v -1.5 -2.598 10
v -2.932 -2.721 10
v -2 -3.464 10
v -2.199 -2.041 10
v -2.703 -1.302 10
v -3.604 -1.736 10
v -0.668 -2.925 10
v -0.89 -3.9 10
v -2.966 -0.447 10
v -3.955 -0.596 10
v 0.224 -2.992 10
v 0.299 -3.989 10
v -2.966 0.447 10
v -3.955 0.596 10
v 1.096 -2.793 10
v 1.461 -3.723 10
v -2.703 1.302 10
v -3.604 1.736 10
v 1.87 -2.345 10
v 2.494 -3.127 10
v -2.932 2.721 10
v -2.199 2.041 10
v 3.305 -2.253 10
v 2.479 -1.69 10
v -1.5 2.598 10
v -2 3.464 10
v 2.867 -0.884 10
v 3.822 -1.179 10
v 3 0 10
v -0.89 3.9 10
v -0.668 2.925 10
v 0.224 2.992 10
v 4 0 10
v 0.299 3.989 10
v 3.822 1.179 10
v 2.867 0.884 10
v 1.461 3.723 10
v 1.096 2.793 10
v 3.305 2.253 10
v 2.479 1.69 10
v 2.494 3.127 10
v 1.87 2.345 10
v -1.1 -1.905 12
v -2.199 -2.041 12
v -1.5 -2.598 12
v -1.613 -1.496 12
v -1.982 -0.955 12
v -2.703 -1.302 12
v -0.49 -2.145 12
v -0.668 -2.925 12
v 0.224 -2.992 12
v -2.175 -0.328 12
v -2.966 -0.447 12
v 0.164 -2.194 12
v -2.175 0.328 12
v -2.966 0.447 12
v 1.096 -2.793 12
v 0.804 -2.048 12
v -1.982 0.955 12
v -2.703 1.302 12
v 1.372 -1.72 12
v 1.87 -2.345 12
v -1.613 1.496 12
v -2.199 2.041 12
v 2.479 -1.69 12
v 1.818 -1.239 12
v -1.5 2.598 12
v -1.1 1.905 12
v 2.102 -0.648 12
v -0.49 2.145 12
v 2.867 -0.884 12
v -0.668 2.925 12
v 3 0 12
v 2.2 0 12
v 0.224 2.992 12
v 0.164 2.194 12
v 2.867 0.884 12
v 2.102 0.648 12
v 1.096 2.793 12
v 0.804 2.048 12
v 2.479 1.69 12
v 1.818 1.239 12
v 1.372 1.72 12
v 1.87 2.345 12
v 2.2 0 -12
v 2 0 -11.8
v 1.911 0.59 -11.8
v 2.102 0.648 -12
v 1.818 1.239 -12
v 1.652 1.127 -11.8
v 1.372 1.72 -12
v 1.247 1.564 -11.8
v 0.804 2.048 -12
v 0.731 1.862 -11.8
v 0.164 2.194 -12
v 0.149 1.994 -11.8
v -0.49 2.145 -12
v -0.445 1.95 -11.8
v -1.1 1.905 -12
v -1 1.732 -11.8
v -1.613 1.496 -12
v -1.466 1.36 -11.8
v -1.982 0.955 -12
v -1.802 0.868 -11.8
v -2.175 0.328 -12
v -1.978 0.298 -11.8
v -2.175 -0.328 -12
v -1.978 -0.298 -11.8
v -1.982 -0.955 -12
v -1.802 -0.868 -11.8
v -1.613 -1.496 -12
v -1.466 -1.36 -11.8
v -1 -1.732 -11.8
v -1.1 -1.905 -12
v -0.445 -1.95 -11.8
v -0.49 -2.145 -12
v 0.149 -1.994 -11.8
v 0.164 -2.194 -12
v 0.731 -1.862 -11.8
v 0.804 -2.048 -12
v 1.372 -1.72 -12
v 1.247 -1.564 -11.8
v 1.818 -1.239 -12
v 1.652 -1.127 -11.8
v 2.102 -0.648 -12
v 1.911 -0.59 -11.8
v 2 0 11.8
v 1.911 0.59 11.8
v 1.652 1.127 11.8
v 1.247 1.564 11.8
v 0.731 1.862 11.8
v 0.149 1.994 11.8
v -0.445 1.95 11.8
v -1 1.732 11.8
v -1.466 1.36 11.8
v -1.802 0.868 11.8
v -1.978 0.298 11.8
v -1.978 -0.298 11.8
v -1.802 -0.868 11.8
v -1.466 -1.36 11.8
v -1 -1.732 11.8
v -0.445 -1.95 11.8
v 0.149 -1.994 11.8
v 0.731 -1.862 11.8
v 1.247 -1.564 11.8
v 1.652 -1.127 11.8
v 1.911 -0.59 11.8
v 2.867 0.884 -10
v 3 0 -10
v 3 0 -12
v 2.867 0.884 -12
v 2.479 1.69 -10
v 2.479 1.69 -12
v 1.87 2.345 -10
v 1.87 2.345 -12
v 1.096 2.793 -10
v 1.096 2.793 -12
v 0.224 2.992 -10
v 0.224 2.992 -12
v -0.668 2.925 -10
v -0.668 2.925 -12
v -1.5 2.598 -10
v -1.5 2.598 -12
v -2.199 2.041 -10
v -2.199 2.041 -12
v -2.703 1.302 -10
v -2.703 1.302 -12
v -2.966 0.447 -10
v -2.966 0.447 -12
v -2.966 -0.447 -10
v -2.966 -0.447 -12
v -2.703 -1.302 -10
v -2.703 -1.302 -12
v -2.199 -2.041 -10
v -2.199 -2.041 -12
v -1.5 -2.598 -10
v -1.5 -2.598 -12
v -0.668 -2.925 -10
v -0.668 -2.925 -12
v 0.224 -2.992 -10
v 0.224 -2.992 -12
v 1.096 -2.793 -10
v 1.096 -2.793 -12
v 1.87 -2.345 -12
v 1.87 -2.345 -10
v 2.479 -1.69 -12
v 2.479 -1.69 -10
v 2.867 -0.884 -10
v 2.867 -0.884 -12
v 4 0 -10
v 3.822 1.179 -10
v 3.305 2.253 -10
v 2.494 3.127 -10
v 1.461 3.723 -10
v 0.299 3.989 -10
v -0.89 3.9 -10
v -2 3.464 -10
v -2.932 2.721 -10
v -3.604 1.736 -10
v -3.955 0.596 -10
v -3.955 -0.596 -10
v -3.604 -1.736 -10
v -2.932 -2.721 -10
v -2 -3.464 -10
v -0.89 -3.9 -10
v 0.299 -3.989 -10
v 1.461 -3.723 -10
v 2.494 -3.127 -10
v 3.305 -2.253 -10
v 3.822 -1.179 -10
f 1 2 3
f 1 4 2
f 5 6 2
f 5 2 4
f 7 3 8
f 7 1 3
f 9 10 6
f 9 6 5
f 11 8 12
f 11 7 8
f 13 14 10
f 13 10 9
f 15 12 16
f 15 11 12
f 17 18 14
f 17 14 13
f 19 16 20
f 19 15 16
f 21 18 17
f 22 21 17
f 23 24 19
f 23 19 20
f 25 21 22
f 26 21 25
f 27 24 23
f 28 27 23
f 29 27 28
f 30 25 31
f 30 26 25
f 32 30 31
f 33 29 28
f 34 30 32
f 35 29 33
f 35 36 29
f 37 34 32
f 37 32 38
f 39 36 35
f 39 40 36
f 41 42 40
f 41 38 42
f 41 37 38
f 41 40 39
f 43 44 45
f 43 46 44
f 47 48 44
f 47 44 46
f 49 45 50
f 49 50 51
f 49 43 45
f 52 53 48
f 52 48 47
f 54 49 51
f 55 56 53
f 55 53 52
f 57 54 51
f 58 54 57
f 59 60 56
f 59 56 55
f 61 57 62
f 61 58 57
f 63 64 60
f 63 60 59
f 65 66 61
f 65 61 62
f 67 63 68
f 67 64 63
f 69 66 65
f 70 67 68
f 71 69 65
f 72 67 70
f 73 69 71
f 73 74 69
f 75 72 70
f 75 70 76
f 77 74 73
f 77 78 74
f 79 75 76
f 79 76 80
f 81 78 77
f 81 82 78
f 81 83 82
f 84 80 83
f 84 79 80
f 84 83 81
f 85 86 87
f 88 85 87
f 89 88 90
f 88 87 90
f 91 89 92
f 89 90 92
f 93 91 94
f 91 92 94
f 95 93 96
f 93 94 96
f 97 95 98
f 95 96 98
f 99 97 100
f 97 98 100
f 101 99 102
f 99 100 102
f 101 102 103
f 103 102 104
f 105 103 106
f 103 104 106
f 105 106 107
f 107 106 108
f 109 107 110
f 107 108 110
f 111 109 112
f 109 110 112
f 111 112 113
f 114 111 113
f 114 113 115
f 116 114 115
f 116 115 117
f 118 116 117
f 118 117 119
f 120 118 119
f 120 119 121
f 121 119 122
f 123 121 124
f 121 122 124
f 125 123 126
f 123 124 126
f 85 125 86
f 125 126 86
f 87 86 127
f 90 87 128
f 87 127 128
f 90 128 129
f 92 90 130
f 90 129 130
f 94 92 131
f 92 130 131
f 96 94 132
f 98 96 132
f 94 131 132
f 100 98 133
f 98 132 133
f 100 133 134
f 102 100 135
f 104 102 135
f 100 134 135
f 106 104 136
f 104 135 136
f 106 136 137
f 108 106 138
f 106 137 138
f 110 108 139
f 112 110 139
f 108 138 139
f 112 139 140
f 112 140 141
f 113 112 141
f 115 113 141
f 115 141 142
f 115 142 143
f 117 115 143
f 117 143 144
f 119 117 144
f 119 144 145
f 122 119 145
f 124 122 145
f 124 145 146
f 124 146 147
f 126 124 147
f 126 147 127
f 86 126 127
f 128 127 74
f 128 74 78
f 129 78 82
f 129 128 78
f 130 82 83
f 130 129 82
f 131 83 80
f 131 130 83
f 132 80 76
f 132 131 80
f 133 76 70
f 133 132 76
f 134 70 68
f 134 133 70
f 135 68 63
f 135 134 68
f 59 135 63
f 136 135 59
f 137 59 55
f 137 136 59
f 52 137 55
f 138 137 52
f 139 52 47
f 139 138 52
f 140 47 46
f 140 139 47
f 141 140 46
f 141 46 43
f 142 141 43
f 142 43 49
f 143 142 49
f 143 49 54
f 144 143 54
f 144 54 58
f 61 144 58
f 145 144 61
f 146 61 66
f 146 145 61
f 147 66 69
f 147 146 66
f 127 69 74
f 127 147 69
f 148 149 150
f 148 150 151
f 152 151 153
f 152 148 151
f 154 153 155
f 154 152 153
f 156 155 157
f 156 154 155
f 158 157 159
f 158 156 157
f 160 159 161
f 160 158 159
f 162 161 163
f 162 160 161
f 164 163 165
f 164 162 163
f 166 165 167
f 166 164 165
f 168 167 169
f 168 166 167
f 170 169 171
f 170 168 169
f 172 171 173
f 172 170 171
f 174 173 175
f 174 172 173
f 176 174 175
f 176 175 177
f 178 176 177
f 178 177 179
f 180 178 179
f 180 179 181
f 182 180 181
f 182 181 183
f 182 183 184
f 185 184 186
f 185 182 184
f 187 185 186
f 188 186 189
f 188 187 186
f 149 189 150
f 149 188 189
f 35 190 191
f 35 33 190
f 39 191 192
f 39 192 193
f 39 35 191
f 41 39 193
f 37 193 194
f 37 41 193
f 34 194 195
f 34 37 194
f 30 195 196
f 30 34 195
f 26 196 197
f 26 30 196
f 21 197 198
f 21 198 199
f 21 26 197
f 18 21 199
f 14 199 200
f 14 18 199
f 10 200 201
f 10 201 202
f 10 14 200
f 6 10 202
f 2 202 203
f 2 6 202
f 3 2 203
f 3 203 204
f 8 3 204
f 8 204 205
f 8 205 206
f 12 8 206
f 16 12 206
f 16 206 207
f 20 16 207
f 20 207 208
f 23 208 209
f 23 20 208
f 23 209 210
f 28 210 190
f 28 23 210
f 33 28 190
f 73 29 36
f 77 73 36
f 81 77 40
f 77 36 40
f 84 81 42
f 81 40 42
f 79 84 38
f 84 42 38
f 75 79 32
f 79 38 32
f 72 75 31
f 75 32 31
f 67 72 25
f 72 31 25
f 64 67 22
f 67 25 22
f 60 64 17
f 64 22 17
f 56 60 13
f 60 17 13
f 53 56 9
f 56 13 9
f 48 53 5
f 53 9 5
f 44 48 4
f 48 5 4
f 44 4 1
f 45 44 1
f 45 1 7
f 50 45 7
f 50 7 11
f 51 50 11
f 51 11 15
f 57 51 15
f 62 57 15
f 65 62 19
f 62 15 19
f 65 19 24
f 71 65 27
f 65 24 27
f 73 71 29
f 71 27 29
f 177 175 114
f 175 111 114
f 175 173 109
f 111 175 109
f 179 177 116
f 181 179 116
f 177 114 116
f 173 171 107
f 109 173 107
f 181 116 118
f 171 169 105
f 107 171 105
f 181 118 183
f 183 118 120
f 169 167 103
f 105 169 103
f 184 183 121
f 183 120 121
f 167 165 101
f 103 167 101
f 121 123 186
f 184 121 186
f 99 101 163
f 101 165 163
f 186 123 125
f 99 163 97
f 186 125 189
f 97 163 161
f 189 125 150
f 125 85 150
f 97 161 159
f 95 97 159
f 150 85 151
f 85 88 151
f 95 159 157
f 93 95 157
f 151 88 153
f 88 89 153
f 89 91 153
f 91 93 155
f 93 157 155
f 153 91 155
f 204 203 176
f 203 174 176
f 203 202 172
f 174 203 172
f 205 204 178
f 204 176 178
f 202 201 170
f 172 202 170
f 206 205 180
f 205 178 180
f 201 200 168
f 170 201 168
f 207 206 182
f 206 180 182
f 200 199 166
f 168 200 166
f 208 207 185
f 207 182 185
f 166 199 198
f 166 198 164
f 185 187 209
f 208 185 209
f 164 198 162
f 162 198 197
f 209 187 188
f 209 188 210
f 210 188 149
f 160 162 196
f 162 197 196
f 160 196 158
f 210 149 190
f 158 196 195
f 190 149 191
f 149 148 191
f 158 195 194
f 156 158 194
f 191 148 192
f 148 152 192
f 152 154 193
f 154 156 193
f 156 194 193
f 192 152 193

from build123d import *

# Parameters (mm, degrees)
SKETCH1_R           = 4
BOSS_EXTRUDE1_DEPTH = 10
SKETCH2_R           = 3
BOSS_EXTRUDE2_DEPTH = 2
SKETCH3_R           = 2
CUT_EXTRUDE1_DEPTH  = 25
CHAMFER1_SIZE       = 0.2


with BuildPart() as part:
    # Sketch1 → Boss-Extrude1 (new body)
    with BuildSketch(Plane.XY):
        Circle(SKETCH1_R)
    boss_extrude1 = extrude(amount=BOSS_EXTRUDE1_DEPTH)

    # Sketch2 → Boss-Extrude2 (add)
    with BuildSketch(Plane.XY.offset(10)):
        Circle(SKETCH2_R)
    boss_extrude2 = extrude(amount=BOSS_EXTRUDE2_DEPTH)

    # Mirror1: Boss-Extrude1, Boss-Extrude2 across plane
    add(boss_extrude1.mirror(Plane.XY))
    add(boss_extrude2.mirror(Plane.XY))

    # Sketch3 → Cut-Extrude1 (cut, through all)
    with BuildSketch(Plane.XY.offset(12)):
        Circle(SKETCH3_R)
    extrude(amount=-CUT_EXTRUDE1_DEPTH, mode=Mode.SUBTRACT)

    # Chamfer1
    chamfer1_edges = [part.edges().sort_by_distance(p)[0] for p in [
        (-2, 0, -12),
        (-2, 0, 12),
    ]]
    chamfer(chamfer1_edges, length=CHAMFER1_SIZE)


solid = part.part
